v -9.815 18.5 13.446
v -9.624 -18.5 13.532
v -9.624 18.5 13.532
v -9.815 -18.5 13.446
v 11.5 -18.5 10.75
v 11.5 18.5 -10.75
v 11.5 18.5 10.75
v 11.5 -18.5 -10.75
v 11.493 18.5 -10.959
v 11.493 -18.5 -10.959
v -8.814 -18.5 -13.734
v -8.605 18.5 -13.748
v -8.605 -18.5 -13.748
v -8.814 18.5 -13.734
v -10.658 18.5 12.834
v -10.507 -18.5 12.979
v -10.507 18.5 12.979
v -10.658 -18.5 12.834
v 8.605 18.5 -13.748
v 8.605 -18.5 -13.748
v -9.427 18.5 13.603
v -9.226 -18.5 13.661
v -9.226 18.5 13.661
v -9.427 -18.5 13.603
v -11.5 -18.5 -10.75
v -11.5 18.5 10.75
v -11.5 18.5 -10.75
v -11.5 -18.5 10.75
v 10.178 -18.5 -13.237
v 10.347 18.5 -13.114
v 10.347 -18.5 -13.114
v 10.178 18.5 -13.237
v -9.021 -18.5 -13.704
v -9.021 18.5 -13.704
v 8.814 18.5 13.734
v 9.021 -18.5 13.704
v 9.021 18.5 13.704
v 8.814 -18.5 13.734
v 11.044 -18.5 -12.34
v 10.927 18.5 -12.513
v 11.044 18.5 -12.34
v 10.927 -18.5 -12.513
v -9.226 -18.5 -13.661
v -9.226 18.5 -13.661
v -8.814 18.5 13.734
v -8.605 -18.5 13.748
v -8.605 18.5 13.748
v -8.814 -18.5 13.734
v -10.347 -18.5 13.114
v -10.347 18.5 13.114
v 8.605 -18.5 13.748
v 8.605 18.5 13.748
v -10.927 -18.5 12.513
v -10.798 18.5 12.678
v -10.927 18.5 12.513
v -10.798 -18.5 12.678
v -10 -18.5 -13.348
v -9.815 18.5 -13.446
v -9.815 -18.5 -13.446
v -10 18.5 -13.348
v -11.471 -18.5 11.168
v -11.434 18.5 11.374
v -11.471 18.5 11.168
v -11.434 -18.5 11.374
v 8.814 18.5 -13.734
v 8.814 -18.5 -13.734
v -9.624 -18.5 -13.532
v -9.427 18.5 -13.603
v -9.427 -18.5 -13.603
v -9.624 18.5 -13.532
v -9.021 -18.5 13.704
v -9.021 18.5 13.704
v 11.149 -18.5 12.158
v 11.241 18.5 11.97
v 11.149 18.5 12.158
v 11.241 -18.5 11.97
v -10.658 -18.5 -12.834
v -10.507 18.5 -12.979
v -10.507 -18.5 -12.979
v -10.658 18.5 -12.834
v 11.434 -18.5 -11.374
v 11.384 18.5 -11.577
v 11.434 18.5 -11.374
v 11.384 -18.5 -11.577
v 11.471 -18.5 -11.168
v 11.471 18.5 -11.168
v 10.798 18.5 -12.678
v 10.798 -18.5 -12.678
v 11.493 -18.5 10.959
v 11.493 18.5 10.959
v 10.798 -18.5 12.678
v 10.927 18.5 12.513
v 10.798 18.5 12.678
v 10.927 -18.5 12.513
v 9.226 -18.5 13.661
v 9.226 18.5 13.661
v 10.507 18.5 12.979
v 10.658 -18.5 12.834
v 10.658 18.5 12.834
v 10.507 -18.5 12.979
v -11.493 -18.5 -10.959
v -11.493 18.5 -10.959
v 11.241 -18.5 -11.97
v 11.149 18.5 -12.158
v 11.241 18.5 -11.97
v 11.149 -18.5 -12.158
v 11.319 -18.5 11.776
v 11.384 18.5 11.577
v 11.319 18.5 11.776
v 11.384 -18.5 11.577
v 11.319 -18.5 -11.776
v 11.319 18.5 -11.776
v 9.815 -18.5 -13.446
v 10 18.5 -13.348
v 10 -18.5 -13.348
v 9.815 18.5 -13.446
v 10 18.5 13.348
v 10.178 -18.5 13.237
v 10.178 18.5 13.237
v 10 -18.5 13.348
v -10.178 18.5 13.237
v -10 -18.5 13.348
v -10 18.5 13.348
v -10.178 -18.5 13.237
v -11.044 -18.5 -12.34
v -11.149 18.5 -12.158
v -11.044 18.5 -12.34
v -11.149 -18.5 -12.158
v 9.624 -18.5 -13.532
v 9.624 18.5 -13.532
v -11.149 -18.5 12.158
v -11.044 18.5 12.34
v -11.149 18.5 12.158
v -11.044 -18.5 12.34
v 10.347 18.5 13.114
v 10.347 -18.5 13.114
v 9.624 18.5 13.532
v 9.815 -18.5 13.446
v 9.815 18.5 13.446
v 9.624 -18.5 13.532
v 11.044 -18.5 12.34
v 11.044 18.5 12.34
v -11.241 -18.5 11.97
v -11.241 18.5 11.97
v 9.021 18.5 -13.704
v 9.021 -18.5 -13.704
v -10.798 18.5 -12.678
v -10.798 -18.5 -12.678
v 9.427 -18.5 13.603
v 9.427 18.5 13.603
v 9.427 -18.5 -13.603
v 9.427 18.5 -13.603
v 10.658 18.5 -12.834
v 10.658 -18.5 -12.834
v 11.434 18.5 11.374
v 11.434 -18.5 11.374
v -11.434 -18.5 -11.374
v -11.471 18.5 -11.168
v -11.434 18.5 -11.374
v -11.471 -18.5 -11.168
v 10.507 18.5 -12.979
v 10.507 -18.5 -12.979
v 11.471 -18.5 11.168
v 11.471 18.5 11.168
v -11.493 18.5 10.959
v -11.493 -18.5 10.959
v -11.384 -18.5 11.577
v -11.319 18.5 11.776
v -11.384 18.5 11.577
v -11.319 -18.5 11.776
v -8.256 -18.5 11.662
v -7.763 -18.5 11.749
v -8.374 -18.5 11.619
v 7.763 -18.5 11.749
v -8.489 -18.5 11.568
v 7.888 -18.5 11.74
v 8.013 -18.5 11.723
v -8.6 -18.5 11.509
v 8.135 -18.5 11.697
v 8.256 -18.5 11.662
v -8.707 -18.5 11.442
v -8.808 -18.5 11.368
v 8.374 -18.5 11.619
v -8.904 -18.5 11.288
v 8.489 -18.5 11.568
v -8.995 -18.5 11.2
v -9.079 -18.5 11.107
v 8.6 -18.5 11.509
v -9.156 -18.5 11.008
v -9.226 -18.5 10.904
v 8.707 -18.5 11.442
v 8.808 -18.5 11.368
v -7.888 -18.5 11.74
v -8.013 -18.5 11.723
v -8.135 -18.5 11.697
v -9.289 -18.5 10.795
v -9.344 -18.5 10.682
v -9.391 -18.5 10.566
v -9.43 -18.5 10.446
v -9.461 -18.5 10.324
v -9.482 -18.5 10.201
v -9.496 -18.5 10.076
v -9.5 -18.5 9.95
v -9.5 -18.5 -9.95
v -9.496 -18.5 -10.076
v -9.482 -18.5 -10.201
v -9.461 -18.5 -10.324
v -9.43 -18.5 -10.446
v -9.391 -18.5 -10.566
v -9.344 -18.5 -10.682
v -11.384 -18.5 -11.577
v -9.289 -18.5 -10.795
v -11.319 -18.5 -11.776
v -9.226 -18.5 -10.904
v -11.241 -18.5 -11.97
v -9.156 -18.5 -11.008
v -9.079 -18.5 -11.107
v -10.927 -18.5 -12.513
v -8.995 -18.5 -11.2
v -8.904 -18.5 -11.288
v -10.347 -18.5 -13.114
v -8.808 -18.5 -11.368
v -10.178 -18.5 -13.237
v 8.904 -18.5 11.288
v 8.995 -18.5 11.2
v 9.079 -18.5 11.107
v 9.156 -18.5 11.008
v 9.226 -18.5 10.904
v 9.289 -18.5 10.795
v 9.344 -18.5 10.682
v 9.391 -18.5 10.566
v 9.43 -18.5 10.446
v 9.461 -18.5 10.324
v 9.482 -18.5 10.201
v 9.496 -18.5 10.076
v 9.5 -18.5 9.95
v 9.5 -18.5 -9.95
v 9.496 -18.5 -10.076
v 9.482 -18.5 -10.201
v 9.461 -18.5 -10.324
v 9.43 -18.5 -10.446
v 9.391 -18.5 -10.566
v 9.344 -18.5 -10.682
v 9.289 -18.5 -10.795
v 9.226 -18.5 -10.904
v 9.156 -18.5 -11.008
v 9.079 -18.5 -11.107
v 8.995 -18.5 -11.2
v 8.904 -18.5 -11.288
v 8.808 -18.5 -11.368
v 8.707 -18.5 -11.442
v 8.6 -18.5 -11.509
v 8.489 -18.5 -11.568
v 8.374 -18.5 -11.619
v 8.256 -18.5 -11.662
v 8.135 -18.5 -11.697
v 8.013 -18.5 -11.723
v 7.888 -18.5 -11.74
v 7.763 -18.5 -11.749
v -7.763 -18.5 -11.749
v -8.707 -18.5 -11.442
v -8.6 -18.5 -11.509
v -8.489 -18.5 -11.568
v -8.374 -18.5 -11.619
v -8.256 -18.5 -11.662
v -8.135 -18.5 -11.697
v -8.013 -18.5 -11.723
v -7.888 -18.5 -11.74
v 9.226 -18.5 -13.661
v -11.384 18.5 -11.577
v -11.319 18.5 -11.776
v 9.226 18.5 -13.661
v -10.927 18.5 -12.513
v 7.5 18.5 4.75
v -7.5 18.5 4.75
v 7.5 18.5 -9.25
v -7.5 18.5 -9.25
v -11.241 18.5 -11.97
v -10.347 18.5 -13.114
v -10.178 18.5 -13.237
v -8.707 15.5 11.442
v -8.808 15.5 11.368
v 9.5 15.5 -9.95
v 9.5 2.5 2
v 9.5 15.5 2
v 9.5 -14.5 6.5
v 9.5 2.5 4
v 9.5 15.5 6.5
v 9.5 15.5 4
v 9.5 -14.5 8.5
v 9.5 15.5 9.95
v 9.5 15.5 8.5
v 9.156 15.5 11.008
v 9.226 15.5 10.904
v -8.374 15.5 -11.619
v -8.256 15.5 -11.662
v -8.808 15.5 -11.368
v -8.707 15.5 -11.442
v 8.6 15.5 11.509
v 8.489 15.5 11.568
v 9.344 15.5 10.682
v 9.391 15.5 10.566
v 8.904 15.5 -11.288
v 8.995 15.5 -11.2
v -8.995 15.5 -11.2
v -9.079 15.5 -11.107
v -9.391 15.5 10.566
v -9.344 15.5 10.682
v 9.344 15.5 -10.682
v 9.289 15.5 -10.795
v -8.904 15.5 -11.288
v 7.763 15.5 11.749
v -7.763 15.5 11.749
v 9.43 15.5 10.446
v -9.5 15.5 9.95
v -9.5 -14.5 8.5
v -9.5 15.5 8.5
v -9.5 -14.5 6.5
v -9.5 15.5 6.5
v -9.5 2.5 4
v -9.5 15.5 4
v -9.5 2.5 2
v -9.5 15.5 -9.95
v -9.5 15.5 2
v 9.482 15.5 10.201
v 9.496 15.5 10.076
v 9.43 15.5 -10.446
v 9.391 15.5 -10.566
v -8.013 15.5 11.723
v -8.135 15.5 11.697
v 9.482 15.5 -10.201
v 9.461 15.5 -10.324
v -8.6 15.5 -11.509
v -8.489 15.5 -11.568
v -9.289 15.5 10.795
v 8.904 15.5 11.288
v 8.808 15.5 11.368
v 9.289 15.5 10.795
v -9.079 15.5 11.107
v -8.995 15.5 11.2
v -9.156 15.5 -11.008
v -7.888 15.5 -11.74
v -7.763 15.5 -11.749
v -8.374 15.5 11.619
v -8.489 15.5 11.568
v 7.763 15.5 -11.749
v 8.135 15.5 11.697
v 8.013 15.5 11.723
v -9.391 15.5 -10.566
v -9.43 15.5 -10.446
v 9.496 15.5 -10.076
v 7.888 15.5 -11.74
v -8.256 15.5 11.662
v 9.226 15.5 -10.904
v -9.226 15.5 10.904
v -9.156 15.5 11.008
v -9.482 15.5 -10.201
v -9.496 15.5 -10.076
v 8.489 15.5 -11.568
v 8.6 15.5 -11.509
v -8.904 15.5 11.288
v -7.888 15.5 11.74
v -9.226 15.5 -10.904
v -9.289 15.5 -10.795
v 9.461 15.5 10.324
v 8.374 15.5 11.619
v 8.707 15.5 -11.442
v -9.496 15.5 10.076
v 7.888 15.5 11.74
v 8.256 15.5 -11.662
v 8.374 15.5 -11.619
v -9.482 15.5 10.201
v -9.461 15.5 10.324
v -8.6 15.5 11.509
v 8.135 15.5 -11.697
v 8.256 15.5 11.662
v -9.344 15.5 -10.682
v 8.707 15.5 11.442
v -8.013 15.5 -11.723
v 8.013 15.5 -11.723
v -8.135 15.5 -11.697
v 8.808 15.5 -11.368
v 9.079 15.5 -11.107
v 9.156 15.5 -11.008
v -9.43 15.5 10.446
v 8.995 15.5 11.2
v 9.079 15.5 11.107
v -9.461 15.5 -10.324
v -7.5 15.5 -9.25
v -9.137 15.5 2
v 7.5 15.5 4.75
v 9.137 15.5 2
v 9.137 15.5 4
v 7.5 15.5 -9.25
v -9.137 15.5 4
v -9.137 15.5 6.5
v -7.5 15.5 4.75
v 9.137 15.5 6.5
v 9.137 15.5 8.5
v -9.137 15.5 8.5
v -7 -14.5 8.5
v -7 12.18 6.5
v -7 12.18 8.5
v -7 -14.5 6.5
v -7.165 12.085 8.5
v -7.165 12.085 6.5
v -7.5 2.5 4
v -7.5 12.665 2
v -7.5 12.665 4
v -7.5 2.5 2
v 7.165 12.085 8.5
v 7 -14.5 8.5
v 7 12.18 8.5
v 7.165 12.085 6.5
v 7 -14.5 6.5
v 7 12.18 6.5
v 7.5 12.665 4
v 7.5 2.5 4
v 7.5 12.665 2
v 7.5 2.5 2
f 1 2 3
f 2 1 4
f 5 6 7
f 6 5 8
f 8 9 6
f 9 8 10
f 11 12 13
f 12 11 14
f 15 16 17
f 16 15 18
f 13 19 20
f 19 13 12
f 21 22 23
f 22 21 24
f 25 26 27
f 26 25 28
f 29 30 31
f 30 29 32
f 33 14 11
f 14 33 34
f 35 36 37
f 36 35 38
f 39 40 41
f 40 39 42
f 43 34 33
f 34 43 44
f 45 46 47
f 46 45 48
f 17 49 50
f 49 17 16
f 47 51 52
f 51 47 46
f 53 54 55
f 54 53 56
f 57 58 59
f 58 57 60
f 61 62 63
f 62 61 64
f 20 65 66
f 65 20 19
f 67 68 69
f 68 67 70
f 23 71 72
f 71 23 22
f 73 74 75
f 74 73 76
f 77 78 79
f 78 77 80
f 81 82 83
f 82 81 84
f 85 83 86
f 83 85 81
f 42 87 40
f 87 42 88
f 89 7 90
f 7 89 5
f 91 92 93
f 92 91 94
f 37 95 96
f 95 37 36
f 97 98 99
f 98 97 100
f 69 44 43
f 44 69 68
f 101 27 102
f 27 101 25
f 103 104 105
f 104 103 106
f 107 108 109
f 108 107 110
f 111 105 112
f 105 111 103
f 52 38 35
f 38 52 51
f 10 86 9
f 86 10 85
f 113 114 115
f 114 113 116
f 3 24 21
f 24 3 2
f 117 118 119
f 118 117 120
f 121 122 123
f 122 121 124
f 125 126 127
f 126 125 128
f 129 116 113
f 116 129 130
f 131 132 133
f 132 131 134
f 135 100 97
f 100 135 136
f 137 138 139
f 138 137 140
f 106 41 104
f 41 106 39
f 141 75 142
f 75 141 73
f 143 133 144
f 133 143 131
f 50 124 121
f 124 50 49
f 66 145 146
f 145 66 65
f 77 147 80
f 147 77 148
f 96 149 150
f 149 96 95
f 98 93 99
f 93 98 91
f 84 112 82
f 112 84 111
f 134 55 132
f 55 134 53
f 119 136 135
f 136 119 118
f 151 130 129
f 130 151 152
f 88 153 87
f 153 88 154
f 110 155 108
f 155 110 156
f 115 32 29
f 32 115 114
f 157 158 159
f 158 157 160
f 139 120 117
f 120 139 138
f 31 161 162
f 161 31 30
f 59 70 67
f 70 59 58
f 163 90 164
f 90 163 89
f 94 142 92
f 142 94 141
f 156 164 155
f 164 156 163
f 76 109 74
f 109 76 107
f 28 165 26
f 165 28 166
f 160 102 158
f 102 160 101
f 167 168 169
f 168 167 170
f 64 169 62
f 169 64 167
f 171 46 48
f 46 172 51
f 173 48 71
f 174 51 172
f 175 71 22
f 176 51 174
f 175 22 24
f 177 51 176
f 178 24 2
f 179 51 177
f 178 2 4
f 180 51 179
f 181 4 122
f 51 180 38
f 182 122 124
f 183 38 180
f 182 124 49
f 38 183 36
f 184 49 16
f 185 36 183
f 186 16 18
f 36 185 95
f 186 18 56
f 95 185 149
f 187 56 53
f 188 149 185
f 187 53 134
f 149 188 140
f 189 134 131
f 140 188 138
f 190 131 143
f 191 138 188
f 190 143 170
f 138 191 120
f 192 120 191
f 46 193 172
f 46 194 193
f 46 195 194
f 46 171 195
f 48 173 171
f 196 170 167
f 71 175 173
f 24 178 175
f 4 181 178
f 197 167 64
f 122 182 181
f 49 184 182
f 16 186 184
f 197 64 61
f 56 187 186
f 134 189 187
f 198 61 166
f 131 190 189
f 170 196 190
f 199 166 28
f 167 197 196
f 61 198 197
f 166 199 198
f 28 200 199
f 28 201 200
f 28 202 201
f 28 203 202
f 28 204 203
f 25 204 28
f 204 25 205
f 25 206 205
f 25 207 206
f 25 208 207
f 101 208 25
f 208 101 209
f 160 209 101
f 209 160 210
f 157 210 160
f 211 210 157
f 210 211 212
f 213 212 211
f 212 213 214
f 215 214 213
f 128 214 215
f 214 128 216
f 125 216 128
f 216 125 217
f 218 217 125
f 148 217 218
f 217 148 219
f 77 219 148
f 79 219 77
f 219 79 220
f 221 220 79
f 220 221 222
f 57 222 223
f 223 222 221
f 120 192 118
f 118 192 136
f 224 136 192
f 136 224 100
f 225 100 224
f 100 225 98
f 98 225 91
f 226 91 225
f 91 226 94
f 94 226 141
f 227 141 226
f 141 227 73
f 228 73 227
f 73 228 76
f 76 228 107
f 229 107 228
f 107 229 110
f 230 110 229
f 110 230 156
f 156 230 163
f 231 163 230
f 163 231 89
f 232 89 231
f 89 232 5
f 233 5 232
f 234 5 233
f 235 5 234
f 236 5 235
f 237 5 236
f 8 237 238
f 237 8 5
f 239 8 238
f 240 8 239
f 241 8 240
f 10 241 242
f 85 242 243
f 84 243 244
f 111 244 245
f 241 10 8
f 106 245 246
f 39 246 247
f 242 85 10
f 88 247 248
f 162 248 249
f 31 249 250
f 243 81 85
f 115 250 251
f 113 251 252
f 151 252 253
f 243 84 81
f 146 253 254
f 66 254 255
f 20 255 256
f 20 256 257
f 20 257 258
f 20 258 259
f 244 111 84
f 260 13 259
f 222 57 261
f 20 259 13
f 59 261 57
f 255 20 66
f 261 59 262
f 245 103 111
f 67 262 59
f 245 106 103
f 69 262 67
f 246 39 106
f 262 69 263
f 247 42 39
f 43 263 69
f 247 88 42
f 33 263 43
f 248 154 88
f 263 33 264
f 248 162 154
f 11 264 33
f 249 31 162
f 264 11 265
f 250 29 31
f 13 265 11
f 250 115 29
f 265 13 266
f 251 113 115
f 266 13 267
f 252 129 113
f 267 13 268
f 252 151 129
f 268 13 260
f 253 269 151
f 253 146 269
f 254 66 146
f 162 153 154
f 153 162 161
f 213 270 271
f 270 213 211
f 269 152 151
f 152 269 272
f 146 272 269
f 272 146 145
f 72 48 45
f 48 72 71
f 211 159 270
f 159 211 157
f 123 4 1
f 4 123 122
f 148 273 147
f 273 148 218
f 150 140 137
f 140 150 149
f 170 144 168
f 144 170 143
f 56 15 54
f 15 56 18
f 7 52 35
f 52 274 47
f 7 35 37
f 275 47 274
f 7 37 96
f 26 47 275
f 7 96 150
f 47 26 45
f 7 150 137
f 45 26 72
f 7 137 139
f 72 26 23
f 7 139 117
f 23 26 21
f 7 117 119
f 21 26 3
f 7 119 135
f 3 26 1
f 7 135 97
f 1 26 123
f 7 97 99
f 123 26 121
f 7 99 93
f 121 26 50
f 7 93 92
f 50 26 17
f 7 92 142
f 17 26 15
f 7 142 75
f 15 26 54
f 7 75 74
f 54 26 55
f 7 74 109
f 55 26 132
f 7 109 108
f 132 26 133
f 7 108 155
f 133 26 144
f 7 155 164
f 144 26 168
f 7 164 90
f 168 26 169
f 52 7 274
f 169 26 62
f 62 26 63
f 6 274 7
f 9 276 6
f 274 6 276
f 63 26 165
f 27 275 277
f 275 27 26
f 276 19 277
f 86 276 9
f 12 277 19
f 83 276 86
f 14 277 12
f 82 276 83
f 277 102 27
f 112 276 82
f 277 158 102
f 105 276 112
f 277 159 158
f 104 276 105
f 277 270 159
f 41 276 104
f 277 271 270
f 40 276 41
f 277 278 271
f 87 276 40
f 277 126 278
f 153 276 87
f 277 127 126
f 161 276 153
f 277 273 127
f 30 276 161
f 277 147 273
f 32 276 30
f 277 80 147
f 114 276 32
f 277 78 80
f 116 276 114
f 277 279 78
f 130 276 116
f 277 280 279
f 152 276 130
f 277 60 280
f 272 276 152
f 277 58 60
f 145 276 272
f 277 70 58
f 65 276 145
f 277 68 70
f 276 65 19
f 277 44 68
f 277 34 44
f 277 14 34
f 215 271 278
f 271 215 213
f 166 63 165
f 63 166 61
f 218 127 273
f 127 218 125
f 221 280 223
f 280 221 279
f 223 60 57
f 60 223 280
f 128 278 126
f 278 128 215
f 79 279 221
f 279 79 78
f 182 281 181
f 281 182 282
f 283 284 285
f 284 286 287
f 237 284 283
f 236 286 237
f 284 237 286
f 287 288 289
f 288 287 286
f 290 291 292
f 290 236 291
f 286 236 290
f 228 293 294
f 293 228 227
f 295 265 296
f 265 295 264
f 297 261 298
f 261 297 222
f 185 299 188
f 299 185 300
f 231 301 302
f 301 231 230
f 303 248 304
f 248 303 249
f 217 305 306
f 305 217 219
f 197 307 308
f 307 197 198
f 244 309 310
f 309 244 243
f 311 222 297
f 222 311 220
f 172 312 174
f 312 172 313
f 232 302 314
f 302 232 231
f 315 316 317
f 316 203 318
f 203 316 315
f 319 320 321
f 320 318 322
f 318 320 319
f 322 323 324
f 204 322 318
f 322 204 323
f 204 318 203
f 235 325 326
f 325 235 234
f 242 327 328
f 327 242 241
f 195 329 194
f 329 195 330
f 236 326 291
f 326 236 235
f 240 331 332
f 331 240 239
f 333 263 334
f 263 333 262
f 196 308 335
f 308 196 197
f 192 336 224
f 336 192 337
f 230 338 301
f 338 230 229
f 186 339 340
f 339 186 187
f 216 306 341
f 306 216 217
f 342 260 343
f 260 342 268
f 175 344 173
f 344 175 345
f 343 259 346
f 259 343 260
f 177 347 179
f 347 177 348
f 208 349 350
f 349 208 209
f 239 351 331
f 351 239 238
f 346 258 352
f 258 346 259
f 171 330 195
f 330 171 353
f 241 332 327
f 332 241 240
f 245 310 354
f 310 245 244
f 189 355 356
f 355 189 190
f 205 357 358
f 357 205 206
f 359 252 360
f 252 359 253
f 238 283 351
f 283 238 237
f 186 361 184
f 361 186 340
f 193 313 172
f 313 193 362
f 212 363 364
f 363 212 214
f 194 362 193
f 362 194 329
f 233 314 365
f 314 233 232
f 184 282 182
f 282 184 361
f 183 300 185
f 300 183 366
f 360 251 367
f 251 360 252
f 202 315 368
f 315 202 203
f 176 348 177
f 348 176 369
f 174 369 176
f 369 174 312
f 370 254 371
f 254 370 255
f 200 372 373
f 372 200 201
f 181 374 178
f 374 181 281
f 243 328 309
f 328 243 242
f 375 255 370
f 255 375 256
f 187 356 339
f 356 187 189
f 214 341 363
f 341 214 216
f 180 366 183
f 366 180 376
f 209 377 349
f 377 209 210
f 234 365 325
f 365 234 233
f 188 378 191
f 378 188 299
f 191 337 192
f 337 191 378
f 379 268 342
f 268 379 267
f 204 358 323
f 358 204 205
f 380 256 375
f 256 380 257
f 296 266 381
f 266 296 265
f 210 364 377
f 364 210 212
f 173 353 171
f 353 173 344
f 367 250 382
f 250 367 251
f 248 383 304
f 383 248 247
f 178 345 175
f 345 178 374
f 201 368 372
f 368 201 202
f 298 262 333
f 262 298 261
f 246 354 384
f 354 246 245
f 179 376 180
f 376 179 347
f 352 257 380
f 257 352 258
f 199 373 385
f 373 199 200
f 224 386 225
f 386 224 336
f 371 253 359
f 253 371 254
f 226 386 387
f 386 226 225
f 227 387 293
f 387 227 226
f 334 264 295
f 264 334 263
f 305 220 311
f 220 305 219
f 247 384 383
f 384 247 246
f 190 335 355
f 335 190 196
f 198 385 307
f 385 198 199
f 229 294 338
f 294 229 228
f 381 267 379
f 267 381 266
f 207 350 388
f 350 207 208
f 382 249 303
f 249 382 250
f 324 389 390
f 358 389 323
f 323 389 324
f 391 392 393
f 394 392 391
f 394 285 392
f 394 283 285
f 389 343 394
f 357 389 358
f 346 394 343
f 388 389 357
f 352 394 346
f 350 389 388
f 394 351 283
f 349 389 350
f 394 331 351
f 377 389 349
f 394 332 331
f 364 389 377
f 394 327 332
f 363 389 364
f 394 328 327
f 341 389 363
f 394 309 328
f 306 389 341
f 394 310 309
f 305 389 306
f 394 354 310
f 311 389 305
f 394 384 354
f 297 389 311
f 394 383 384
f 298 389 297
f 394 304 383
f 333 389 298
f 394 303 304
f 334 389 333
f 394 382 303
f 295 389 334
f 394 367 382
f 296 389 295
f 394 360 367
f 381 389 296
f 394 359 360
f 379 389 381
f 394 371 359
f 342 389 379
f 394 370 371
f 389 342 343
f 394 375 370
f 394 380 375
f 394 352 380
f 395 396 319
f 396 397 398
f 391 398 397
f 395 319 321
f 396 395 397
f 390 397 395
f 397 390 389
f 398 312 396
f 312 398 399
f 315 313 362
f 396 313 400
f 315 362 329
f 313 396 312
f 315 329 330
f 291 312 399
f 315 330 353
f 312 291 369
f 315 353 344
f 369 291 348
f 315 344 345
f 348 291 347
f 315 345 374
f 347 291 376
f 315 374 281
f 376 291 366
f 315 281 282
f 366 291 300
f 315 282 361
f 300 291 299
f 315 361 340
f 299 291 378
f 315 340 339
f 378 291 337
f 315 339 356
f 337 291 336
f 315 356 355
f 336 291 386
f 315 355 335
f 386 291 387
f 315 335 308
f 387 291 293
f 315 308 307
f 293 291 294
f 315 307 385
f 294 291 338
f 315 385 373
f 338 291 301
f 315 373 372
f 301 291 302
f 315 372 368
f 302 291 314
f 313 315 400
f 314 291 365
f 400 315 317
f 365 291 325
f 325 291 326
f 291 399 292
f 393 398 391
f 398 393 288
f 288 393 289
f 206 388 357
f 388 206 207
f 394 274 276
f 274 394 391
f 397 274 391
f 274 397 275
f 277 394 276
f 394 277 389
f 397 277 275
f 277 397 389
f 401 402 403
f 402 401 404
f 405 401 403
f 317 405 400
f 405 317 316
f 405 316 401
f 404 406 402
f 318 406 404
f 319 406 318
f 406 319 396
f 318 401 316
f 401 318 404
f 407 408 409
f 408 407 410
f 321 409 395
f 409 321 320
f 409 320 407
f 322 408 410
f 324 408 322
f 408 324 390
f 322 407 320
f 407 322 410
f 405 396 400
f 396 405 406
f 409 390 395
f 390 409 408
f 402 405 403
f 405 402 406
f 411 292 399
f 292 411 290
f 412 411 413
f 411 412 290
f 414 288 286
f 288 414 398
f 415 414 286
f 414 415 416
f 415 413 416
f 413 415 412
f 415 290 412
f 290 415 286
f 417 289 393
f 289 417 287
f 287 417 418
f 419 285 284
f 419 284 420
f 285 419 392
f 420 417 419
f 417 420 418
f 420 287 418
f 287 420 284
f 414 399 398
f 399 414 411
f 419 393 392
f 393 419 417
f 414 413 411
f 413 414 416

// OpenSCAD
// box to insert pcb and fix with 2 screws
// for factory made PCB (not universal pcb)

pcb_size = [18,34,1.6]; // size of PCB

box_inner = [19,35,21+2.5];
thick = 2;

rail_top   = [2,13,2];
rail_bot   = [2.5,30,2];
rail_spc   = 2.5;
// todo rail from rear, 45 deg cut
// rail_rear  = 4;

pcb_bottom = 2.5+3; // space from bottom
usb_pos = 14; // from PCB bottom

module pcb()
{
  translate([0,-thick/2,box_inner[2]/2-rail_bot[2]/2-pcb_bottom])
  cube(pcb_size,center=true);
}

module rounded_cube(v,r)
{
  minkowski()
  {
    h_minkowski=0.01;
    cube(v-[2*r,2*r,h_minkowski],center=true);
    cylinder(h=h_minkowski,r=r,$fn=90,center=true);
  };
}

module rail_old()
{
  difference()
  {
    cube(rail_outer,center=true);
    cube(rail_inner,center=true);
  }
}

module rail(i)
{
  translate([-i*rail_bot[0]/2,(-rail_bot[1]+box_inner[1])/2-thick,rail_bot[2]/2+rail_spc/2])
    cube(rail_bot,center=true);
  translate([-i*rail_top[0]/2,(-rail_top[1]+box_inner[1])/2-thick,-rail_top[2]/2-rail_spc/2])
    cube(rail_top,center=true);
}

// make space for antenna cable
module rail_cut(i)
{
  translate([-i*rail_bot[0]/2-i*2,(-rail_bot[1]*0+box_inner[1])/2-thick,rail_bot[2]/2+rail_spc/2])
    rotate([0,0,-30*i])
    cube([5,5,40],center=true);
}

module rails()
{
  for(i=[-1,1])
    translate([(box_inner[0]/2)*i,0,box_inner[2]/2-rail_bot[2]/2-pcb_bottom])
      difference()
      {
        rail(i);
        rail_cut(i);
      }
}

// not used
module usb_connector_cut()
{
  translate([0,-box_inner[1]/2,+box_inner[2]/2-pcb_bottom-usb_pos])
  cube([31,10,6],center=true);
}

module rj12_connector_cut_rear()
{
  translate([0,box_inner[1]/2,+box_inner[2]/2-pcb_bottom-8.5])
  cube([15,10,14],center=true);
}

module rj12_connector_cut_side()
{
  translate([0,box_inner[1]/2-10,+box_inner[2]/2-pcb_bottom-16])
  cube([13,16,10],center=true);
}

// not used - can't screw thru antenna
module screw_holes()
{
  for(i=[-1,1])
  translate([i*2.54*3,box_inner[1]/2-6,box_inner[2]/2])
    cylinder(d=1.8,h=10,$fn=16,center=true);
}

module box()
{
  difference()
  {
    cube_dim=box_inner+[2,1,2]*thick;
    rotate([90,0,0])
    rounded_cube([cube_dim[0],cube_dim[2],cube_dim[1]],r=3);
    translate([0,-thick,0])
    rotate([90,0,0])
    rounded_cube([box_inner[0],box_inner[2],box_inner[1]],r=1.8);
    // usb_connector_cut();
    rj12_connector_cut_rear();
    //rj12_connector_cut_side();
    // screw_holes();
  }
  rails();
}

box();
%pcb();
